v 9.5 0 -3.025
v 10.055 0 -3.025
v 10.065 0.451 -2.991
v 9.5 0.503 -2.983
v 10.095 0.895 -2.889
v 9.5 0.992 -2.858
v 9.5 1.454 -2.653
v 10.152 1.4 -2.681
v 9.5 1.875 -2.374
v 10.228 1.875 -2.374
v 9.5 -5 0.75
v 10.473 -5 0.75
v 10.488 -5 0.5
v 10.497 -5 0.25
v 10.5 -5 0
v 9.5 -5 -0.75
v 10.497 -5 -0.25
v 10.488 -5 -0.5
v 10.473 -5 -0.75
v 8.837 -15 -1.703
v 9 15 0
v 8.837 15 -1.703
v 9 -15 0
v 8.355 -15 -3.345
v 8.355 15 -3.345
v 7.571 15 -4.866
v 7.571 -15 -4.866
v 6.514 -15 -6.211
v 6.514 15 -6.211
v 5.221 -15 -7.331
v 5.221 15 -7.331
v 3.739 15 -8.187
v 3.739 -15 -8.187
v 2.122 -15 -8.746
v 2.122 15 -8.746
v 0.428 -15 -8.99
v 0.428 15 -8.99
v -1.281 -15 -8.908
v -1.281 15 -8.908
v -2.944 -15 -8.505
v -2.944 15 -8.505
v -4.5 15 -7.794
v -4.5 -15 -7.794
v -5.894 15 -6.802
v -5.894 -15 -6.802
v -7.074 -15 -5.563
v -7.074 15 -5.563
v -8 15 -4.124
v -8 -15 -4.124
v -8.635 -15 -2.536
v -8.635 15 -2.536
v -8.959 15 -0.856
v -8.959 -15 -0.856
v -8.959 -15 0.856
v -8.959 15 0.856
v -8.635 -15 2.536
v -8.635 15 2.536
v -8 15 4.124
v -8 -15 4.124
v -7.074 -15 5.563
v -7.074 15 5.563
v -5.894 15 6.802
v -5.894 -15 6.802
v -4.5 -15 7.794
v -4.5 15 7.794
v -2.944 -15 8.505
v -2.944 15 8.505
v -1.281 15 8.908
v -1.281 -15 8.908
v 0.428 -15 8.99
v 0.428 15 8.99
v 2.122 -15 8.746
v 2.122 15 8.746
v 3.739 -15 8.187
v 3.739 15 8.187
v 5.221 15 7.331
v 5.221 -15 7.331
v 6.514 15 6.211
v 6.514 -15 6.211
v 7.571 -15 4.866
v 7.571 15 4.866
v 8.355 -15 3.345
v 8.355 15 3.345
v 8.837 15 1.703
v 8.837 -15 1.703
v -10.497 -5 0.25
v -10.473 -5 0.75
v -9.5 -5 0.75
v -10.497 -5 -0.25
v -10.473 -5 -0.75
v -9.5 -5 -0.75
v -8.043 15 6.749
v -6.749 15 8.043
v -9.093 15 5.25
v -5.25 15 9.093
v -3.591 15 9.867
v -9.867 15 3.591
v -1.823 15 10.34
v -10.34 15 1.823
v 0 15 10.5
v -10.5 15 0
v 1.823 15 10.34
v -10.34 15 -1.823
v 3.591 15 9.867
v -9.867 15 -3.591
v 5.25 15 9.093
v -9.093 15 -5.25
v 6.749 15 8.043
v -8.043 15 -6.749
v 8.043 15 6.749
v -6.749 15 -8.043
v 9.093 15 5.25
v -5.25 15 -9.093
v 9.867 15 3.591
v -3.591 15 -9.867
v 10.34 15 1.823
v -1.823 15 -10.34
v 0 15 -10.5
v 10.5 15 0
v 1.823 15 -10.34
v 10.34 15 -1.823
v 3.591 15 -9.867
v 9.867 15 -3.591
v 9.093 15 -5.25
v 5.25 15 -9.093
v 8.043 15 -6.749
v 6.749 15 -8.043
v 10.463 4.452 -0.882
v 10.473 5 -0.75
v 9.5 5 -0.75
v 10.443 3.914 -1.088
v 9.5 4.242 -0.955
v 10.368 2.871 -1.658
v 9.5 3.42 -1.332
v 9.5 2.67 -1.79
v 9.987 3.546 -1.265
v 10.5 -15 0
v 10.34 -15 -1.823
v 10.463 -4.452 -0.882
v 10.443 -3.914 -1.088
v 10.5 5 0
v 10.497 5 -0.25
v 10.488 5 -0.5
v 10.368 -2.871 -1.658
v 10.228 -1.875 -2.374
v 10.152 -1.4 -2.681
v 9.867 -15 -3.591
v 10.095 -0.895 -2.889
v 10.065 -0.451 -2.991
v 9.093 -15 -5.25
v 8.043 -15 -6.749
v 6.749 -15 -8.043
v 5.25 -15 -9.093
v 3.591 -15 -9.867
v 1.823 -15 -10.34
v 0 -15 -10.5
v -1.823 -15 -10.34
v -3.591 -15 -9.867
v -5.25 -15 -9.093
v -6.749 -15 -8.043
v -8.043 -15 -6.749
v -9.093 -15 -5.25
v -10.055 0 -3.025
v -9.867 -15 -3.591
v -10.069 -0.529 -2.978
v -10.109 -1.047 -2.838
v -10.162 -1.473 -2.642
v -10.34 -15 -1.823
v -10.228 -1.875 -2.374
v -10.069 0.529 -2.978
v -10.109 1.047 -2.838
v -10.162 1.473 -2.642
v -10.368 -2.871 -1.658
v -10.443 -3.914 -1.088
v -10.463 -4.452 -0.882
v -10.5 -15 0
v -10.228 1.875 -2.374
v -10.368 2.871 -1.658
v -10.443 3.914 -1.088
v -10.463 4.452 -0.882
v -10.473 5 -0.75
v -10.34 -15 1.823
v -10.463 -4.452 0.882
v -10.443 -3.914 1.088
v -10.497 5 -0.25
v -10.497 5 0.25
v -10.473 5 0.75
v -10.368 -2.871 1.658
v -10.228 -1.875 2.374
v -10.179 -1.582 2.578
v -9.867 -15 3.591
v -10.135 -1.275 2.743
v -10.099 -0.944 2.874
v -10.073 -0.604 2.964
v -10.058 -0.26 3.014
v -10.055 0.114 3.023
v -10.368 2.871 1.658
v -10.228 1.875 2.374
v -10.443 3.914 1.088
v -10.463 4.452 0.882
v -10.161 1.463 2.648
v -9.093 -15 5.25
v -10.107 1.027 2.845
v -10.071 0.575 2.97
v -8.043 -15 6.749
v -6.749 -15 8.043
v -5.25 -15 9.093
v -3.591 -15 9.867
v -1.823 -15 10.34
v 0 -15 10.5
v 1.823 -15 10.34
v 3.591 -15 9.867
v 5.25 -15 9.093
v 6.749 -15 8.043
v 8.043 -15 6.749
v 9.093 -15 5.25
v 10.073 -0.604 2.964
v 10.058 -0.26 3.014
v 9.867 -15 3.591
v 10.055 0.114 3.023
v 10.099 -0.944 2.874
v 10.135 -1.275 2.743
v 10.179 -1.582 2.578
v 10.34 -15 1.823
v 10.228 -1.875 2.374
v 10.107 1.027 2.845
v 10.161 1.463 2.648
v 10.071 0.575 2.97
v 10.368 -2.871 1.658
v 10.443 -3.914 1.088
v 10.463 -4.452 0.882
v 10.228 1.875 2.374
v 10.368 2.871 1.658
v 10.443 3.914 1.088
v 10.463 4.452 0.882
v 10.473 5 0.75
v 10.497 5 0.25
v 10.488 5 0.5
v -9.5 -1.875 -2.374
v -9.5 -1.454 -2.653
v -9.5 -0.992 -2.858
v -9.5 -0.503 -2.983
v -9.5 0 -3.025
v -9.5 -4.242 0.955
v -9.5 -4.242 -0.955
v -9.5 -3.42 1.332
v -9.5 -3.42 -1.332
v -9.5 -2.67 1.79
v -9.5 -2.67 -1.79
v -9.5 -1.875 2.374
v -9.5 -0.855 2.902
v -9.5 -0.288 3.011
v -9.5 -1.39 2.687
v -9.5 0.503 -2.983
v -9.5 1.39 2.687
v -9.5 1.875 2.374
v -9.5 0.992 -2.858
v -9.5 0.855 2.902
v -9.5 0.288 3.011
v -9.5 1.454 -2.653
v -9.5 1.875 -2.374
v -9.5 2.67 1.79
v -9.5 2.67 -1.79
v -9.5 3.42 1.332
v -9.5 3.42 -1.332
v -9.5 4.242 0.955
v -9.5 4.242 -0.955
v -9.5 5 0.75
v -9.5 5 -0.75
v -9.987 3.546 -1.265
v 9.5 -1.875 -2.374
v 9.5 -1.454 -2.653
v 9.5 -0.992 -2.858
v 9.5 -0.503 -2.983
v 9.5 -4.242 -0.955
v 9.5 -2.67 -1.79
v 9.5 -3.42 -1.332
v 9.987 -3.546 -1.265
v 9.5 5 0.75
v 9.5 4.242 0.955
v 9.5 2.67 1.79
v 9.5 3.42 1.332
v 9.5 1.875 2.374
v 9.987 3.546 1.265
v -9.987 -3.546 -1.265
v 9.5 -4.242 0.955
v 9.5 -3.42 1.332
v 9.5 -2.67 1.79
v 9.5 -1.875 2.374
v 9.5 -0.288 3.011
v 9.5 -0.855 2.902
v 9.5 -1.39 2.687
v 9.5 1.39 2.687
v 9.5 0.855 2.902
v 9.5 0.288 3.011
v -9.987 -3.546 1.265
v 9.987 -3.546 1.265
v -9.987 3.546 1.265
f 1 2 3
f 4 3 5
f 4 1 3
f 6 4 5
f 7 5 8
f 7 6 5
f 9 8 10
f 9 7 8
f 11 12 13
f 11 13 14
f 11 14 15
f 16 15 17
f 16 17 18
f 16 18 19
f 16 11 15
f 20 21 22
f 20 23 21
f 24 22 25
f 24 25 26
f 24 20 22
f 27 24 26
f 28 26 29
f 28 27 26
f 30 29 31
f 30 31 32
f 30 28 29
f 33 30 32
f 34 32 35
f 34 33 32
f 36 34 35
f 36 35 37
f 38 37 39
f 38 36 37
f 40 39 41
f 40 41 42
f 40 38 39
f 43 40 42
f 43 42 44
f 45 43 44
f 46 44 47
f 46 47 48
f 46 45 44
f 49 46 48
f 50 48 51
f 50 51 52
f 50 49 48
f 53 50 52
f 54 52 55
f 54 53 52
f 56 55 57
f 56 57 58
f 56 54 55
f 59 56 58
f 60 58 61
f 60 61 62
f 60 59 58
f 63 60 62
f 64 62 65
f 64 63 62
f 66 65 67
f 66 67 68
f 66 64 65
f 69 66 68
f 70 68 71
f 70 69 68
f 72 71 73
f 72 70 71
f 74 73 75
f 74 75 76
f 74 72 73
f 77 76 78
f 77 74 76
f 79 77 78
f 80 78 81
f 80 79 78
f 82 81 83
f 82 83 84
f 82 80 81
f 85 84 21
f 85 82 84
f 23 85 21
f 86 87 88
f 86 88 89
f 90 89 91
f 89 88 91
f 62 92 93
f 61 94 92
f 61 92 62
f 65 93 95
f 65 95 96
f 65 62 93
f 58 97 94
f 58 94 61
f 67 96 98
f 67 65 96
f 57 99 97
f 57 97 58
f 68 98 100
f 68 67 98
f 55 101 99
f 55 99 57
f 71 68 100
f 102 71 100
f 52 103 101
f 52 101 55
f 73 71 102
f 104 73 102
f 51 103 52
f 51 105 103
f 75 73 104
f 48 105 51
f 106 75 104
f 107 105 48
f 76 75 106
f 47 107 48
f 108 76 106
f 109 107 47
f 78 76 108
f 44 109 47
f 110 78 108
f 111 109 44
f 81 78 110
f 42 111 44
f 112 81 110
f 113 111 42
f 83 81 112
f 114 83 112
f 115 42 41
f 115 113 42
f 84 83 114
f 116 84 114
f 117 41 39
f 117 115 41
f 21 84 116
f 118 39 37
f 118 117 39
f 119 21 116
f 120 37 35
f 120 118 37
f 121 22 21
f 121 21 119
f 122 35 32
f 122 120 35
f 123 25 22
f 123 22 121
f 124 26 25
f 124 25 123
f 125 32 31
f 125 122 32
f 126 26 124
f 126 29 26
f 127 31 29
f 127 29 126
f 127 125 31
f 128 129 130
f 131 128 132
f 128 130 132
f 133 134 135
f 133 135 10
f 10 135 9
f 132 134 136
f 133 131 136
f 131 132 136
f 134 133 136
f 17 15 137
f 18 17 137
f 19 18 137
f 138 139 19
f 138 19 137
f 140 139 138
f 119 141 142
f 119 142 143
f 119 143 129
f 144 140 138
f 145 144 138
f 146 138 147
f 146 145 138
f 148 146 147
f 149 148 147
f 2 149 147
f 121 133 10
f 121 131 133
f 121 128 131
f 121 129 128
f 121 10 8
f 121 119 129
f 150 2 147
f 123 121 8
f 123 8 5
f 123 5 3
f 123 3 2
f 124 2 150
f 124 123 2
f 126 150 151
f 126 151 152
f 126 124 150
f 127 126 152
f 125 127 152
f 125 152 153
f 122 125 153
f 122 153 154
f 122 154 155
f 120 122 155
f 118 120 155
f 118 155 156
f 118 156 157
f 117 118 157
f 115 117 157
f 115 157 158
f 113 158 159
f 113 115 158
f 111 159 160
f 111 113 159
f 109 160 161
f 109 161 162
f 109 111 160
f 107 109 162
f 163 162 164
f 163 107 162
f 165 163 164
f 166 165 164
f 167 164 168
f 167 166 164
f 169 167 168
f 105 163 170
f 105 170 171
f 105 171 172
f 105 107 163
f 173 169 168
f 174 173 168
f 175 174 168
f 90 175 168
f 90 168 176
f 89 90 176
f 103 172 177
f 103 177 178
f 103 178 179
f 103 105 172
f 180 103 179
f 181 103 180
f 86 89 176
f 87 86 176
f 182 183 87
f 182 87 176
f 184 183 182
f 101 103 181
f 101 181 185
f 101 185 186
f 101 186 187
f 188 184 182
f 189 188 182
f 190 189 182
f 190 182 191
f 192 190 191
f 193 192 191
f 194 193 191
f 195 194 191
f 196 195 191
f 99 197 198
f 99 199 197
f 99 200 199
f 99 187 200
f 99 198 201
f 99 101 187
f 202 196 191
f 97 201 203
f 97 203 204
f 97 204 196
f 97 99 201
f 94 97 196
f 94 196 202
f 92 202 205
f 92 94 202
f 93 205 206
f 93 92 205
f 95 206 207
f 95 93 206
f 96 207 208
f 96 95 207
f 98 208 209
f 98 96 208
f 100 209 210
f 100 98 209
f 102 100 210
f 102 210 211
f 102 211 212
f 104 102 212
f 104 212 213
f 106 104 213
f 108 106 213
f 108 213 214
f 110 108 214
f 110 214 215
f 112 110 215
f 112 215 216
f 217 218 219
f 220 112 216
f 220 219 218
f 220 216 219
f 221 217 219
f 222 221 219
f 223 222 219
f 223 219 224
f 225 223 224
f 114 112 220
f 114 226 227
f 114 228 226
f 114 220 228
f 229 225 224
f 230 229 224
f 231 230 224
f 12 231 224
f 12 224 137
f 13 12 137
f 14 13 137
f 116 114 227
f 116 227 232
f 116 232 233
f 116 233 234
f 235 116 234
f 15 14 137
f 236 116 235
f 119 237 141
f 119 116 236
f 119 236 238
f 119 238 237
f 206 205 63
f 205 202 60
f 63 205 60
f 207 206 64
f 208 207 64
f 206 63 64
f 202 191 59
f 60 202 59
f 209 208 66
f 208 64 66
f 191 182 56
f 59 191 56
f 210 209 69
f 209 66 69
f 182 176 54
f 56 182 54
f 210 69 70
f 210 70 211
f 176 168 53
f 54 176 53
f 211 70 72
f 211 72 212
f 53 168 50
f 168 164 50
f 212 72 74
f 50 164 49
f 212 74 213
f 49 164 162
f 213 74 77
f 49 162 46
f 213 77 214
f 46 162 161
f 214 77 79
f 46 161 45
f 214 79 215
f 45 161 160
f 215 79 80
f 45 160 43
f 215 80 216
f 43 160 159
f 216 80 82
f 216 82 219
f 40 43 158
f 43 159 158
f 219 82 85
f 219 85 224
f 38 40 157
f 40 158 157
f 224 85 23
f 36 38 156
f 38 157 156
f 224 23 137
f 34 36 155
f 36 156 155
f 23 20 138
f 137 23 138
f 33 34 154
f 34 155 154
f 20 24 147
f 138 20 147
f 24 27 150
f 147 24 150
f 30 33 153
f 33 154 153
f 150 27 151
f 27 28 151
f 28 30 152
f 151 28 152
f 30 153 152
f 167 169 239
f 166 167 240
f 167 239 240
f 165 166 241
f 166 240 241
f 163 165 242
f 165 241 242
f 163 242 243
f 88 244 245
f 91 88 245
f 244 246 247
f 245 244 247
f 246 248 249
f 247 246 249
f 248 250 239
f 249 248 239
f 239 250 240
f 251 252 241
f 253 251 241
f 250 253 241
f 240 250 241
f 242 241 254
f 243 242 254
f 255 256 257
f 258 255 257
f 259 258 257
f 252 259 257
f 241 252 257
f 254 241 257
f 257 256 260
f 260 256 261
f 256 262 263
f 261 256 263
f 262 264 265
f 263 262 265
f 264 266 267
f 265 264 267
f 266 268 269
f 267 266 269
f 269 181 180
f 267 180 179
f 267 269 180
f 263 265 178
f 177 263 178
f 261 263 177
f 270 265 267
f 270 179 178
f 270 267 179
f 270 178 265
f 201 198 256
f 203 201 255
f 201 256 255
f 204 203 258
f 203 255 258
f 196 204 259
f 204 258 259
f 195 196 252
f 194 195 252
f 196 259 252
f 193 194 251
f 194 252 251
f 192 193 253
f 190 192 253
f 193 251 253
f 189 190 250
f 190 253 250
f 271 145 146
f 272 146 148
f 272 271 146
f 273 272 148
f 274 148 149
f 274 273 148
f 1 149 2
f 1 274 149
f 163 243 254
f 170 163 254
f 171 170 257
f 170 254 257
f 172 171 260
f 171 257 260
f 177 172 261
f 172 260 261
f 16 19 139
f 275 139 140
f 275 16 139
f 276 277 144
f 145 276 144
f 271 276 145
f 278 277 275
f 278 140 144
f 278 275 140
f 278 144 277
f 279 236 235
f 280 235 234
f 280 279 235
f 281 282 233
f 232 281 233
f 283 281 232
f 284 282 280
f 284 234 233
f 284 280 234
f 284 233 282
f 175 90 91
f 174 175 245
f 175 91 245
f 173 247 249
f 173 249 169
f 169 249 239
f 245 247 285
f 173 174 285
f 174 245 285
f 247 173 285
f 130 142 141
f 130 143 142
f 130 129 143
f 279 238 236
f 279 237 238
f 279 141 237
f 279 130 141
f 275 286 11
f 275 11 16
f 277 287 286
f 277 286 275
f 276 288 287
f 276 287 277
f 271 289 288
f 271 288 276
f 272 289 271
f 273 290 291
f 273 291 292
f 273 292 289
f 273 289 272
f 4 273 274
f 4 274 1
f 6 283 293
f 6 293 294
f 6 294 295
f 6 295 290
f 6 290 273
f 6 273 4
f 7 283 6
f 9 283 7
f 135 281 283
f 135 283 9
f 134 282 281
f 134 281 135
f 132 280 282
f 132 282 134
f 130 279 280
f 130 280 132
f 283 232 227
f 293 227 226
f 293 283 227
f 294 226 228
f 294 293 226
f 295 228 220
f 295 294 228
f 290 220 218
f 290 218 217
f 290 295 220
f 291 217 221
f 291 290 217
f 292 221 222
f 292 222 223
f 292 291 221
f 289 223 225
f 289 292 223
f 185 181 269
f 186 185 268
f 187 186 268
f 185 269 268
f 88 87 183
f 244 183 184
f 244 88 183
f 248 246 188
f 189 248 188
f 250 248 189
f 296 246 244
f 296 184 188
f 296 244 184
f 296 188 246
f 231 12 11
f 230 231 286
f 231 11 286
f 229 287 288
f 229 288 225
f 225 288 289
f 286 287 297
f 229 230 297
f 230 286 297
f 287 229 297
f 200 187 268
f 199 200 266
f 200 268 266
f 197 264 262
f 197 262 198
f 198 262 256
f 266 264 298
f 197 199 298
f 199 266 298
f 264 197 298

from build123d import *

# Parameters (mm, degrees)
SKETCH1_R           = 10.5
SKETCH1_R_2         = 9
BOSS_EXTRUDE1_DEPTH = 15
CUT_EXTRUDE1_START  = 9.5
CUT_EXTRUDE1_DEPTH  = 2


with BuildPart() as part:
    # Sketch1 → Boss-Extrude1 (new body, symmetric)
    with BuildSketch(Plane(origin=(0, 0, 0), x_dir=(1, 0, 0), z_dir=(0, 1, 0))):
        Circle(SKETCH1_R)
        Circle(SKETCH1_R_2, mode=Mode.SUBTRACT)
    extrude(amount=BOSS_EXTRUDE1_DEPTH, both=True)

    # Sketch2 → Cut-Extrude1 (cut)
    with BuildSketch(Plane(origin=(0, 0, 0), x_dir=(0, 0, -1), z_dir=(1, 0, 0)).offset(CUT_EXTRUDE1_START)):
        with BuildLine():
            ThreePointArc((-2.374052789, 1.874699538), (-1.648827359, 2.536137485), (-0.75, 2.93055029))
            Line((-0.75, 2.93055029), (-0.75, 5))
            add(Edge.make_bspline(
                [(-0.75, 5), (-0.968656254, 3.654443702), (-2.374052789, 1.874699538)],
                knots=[0, 0, 0, 1, 1, 1], degree=2))
        make_face()
        with BuildLine():
            ThreePointArc((-2.374052789, -1.874699538), (-1.648827359, -2.536137485), (-0.75, -2.93055029))
            Line((-0.75, -2.93055029), (-0.75, 2.93055029))
            ThreePointArc((-0.75, 2.93055029), (-1.648827359, 2.536137485), (-2.374052789, 1.874699538))
            ThreePointArc((-2.374052789, 1.874699538), (-3.025, 0), (-2.374052789, -1.874699538))
        make_face()
        with BuildLine():
            Line((0.75, 2.93055029), (0.75, -2.93055029))
            ThreePointArc((0.75, -2.93055029), (1.648827359, -2.536137485), (2.374052789, -1.874699538))
            ThreePointArc((2.374052789, -1.874699538), (2.857633171, -0.992248788), (3.025, 0))
            ThreePointArc((3.025, 0), (2.857633171, 0.992248788), (2.374052789, 1.874699538))
            ThreePointArc((2.374052789, 1.874699538), (1.648827359, 2.536137485), (0.75, 2.93055029))
        make_face()
        with BuildLine():
            Line((0.75, 5), (0.75, 2.93055029))
            ThreePointArc((0.75, 2.93055029), (1.648827359, 2.536137485), (2.374052789, 1.874699538))
            add(Edge.make_bspline(
                [(0.75, 5), (0.968656254, 3.654443702), (2.374052789, 1.874699538)],
                knots=[0, 0, 0, 1, 1, 1], degree=2))
        make_face()
        with BuildLine():
            Line((0.75, -2.93055029), (0.75, -5))
            add(Edge.make_bspline(
                [(0.75, -5), (0.968656254, -3.654443702), (2.374052789, -1.874699538)],
                knots=[0, 0, 0, 1, 1, 1], degree=2))
            ThreePointArc((2.374052789, -1.874699538), (1.648827359, -2.536137485), (0.75, -2.93055029))
        make_face()
        with BuildLine():
            Line((-0.75, -5), (0.75, -5))
            Line((0.75, -5), (0.75, -2.93055029))
            ThreePointArc((0.75, -2.93055029), (0, -3.025), (-0.75, -2.93055029))
            Line((-0.75, -2.93055029), (-0.75, -5))
        make_face()
        with BuildLine():
            add(Edge.make_bspline(
                [(-0.75, -5), (-0.968656254, -3.654443702), (-2.374052789, -1.874699538)],
                knots=[0, 0, 0, 1, 1, 1], degree=2))
            Line((-0.75, -5), (-0.75, -2.93055029))
            ThreePointArc((-0.75, -2.93055029), (-1.648827359, -2.536137485), (-2.374052789, -1.874699538))
        make_face()
        with BuildLine():
            ThreePointArc((-0.75, 2.93055029), (0, 3.025), (0.75, 2.93055029))
            Line((0.75, 2.93055029), (0.75, 5))
            Line((0.75, 5), (-0.75, 5))
            Line((-0.75, 5), (-0.75, 2.93055029))
        make_face()
        with BuildLine():
            ThreePointArc((-0.75, -2.93055029), (0, -3.025), (0.75, -2.93055029))
            Line((0.75, -2.93055029), (0.75, 2.93055029))
            ThreePointArc((0.75, 2.93055029), (0, 3.025), (-0.75, 2.93055029))
            Line((-0.75, 2.93055029), (-0.75, -2.93055029))
        make_face()
    cut_extrude1 = extrude(amount=CUT_EXTRUDE1_DEPTH, mode=Mode.SUBTRACT)

    # Mirror1: Cut-Extrude1 across plane
    add(cut_extrude1.mirror(Plane(origin=(0, 0, 0), x_dir=(0, 0, 1), z_dir=(1, 0, 0))), mode=Mode.SUBTRACT)


solid = part.part
